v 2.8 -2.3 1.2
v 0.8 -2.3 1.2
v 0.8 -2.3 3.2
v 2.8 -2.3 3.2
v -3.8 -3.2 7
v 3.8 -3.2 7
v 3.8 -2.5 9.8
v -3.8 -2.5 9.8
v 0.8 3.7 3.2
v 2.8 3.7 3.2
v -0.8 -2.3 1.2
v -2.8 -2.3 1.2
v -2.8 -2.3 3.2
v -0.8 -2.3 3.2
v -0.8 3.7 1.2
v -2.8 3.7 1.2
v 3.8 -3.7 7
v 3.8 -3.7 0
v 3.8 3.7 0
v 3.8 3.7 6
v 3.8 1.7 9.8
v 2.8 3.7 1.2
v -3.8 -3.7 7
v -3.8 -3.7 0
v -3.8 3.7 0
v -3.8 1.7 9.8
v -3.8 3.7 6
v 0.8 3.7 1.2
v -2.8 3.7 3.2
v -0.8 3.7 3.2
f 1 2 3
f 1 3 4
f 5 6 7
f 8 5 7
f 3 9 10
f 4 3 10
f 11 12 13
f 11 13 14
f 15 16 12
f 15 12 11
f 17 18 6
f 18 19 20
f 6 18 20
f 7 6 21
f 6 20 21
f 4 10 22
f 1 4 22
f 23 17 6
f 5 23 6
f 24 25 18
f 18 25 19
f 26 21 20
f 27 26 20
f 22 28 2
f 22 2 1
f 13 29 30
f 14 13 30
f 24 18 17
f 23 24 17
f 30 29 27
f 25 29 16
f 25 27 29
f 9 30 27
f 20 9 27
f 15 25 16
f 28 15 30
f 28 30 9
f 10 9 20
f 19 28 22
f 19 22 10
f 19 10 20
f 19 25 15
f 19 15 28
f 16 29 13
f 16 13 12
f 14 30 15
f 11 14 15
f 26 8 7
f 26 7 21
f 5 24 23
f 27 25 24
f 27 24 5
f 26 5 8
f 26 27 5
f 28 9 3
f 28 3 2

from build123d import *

# Parameters (mm, degrees)
SKETCH1_W           = 7.6
SKETCH1_H           = 7.4
BOSS_EXTRUDE1_DEPTH = 6
BOSS_EXTRUDE2_DEPTH = 7.6
SKETCH3_W           = 2
SKETCH3_H           = 2
CUT_EXTRUDE1_DEPTH  = 6


with BuildPart() as part:
    # Sketch1 → Boss-Extrude1 (new body)
    with BuildSketch(Plane.XY):
        Rectangle(SKETCH1_W, SKETCH1_H)
    extrude(amount=BOSS_EXTRUDE1_DEPTH)

    # Sketch2 → Boss-Extrude2 (add)
    with BuildSketch(Plane(origin=(3.8, 0, 0), x_dir=(0, 0, -1), z_dir=(1, 0, 0))):
        Polygon((-6, 3.7), (-6, -3.7), (-7, -3.7), (-7, -3.2), (-9.8, -2.5), (-9.8, 1.7), align=None)
    extrude(amount=-BOSS_EXTRUDE2_DEPTH)

    # Sketch3 → Cut-Extrude1 (cut)
    with BuildSketch(Plane(origin=(0, 3.7, 0), x_dir=(1, 0, 0), z_dir=(0, 1, 0))):
        with Locations((-1.8, -2.2)):
            Rectangle(SKETCH3_W, SKETCH3_H)
        with Locations((1.8, -2.2)):
            Rectangle(SKETCH3_W, SKETCH3_H)
    extrude(amount=-CUT_EXTRUDE1_DEPTH, mode=Mode.SUBTRACT)


solid = part.part
